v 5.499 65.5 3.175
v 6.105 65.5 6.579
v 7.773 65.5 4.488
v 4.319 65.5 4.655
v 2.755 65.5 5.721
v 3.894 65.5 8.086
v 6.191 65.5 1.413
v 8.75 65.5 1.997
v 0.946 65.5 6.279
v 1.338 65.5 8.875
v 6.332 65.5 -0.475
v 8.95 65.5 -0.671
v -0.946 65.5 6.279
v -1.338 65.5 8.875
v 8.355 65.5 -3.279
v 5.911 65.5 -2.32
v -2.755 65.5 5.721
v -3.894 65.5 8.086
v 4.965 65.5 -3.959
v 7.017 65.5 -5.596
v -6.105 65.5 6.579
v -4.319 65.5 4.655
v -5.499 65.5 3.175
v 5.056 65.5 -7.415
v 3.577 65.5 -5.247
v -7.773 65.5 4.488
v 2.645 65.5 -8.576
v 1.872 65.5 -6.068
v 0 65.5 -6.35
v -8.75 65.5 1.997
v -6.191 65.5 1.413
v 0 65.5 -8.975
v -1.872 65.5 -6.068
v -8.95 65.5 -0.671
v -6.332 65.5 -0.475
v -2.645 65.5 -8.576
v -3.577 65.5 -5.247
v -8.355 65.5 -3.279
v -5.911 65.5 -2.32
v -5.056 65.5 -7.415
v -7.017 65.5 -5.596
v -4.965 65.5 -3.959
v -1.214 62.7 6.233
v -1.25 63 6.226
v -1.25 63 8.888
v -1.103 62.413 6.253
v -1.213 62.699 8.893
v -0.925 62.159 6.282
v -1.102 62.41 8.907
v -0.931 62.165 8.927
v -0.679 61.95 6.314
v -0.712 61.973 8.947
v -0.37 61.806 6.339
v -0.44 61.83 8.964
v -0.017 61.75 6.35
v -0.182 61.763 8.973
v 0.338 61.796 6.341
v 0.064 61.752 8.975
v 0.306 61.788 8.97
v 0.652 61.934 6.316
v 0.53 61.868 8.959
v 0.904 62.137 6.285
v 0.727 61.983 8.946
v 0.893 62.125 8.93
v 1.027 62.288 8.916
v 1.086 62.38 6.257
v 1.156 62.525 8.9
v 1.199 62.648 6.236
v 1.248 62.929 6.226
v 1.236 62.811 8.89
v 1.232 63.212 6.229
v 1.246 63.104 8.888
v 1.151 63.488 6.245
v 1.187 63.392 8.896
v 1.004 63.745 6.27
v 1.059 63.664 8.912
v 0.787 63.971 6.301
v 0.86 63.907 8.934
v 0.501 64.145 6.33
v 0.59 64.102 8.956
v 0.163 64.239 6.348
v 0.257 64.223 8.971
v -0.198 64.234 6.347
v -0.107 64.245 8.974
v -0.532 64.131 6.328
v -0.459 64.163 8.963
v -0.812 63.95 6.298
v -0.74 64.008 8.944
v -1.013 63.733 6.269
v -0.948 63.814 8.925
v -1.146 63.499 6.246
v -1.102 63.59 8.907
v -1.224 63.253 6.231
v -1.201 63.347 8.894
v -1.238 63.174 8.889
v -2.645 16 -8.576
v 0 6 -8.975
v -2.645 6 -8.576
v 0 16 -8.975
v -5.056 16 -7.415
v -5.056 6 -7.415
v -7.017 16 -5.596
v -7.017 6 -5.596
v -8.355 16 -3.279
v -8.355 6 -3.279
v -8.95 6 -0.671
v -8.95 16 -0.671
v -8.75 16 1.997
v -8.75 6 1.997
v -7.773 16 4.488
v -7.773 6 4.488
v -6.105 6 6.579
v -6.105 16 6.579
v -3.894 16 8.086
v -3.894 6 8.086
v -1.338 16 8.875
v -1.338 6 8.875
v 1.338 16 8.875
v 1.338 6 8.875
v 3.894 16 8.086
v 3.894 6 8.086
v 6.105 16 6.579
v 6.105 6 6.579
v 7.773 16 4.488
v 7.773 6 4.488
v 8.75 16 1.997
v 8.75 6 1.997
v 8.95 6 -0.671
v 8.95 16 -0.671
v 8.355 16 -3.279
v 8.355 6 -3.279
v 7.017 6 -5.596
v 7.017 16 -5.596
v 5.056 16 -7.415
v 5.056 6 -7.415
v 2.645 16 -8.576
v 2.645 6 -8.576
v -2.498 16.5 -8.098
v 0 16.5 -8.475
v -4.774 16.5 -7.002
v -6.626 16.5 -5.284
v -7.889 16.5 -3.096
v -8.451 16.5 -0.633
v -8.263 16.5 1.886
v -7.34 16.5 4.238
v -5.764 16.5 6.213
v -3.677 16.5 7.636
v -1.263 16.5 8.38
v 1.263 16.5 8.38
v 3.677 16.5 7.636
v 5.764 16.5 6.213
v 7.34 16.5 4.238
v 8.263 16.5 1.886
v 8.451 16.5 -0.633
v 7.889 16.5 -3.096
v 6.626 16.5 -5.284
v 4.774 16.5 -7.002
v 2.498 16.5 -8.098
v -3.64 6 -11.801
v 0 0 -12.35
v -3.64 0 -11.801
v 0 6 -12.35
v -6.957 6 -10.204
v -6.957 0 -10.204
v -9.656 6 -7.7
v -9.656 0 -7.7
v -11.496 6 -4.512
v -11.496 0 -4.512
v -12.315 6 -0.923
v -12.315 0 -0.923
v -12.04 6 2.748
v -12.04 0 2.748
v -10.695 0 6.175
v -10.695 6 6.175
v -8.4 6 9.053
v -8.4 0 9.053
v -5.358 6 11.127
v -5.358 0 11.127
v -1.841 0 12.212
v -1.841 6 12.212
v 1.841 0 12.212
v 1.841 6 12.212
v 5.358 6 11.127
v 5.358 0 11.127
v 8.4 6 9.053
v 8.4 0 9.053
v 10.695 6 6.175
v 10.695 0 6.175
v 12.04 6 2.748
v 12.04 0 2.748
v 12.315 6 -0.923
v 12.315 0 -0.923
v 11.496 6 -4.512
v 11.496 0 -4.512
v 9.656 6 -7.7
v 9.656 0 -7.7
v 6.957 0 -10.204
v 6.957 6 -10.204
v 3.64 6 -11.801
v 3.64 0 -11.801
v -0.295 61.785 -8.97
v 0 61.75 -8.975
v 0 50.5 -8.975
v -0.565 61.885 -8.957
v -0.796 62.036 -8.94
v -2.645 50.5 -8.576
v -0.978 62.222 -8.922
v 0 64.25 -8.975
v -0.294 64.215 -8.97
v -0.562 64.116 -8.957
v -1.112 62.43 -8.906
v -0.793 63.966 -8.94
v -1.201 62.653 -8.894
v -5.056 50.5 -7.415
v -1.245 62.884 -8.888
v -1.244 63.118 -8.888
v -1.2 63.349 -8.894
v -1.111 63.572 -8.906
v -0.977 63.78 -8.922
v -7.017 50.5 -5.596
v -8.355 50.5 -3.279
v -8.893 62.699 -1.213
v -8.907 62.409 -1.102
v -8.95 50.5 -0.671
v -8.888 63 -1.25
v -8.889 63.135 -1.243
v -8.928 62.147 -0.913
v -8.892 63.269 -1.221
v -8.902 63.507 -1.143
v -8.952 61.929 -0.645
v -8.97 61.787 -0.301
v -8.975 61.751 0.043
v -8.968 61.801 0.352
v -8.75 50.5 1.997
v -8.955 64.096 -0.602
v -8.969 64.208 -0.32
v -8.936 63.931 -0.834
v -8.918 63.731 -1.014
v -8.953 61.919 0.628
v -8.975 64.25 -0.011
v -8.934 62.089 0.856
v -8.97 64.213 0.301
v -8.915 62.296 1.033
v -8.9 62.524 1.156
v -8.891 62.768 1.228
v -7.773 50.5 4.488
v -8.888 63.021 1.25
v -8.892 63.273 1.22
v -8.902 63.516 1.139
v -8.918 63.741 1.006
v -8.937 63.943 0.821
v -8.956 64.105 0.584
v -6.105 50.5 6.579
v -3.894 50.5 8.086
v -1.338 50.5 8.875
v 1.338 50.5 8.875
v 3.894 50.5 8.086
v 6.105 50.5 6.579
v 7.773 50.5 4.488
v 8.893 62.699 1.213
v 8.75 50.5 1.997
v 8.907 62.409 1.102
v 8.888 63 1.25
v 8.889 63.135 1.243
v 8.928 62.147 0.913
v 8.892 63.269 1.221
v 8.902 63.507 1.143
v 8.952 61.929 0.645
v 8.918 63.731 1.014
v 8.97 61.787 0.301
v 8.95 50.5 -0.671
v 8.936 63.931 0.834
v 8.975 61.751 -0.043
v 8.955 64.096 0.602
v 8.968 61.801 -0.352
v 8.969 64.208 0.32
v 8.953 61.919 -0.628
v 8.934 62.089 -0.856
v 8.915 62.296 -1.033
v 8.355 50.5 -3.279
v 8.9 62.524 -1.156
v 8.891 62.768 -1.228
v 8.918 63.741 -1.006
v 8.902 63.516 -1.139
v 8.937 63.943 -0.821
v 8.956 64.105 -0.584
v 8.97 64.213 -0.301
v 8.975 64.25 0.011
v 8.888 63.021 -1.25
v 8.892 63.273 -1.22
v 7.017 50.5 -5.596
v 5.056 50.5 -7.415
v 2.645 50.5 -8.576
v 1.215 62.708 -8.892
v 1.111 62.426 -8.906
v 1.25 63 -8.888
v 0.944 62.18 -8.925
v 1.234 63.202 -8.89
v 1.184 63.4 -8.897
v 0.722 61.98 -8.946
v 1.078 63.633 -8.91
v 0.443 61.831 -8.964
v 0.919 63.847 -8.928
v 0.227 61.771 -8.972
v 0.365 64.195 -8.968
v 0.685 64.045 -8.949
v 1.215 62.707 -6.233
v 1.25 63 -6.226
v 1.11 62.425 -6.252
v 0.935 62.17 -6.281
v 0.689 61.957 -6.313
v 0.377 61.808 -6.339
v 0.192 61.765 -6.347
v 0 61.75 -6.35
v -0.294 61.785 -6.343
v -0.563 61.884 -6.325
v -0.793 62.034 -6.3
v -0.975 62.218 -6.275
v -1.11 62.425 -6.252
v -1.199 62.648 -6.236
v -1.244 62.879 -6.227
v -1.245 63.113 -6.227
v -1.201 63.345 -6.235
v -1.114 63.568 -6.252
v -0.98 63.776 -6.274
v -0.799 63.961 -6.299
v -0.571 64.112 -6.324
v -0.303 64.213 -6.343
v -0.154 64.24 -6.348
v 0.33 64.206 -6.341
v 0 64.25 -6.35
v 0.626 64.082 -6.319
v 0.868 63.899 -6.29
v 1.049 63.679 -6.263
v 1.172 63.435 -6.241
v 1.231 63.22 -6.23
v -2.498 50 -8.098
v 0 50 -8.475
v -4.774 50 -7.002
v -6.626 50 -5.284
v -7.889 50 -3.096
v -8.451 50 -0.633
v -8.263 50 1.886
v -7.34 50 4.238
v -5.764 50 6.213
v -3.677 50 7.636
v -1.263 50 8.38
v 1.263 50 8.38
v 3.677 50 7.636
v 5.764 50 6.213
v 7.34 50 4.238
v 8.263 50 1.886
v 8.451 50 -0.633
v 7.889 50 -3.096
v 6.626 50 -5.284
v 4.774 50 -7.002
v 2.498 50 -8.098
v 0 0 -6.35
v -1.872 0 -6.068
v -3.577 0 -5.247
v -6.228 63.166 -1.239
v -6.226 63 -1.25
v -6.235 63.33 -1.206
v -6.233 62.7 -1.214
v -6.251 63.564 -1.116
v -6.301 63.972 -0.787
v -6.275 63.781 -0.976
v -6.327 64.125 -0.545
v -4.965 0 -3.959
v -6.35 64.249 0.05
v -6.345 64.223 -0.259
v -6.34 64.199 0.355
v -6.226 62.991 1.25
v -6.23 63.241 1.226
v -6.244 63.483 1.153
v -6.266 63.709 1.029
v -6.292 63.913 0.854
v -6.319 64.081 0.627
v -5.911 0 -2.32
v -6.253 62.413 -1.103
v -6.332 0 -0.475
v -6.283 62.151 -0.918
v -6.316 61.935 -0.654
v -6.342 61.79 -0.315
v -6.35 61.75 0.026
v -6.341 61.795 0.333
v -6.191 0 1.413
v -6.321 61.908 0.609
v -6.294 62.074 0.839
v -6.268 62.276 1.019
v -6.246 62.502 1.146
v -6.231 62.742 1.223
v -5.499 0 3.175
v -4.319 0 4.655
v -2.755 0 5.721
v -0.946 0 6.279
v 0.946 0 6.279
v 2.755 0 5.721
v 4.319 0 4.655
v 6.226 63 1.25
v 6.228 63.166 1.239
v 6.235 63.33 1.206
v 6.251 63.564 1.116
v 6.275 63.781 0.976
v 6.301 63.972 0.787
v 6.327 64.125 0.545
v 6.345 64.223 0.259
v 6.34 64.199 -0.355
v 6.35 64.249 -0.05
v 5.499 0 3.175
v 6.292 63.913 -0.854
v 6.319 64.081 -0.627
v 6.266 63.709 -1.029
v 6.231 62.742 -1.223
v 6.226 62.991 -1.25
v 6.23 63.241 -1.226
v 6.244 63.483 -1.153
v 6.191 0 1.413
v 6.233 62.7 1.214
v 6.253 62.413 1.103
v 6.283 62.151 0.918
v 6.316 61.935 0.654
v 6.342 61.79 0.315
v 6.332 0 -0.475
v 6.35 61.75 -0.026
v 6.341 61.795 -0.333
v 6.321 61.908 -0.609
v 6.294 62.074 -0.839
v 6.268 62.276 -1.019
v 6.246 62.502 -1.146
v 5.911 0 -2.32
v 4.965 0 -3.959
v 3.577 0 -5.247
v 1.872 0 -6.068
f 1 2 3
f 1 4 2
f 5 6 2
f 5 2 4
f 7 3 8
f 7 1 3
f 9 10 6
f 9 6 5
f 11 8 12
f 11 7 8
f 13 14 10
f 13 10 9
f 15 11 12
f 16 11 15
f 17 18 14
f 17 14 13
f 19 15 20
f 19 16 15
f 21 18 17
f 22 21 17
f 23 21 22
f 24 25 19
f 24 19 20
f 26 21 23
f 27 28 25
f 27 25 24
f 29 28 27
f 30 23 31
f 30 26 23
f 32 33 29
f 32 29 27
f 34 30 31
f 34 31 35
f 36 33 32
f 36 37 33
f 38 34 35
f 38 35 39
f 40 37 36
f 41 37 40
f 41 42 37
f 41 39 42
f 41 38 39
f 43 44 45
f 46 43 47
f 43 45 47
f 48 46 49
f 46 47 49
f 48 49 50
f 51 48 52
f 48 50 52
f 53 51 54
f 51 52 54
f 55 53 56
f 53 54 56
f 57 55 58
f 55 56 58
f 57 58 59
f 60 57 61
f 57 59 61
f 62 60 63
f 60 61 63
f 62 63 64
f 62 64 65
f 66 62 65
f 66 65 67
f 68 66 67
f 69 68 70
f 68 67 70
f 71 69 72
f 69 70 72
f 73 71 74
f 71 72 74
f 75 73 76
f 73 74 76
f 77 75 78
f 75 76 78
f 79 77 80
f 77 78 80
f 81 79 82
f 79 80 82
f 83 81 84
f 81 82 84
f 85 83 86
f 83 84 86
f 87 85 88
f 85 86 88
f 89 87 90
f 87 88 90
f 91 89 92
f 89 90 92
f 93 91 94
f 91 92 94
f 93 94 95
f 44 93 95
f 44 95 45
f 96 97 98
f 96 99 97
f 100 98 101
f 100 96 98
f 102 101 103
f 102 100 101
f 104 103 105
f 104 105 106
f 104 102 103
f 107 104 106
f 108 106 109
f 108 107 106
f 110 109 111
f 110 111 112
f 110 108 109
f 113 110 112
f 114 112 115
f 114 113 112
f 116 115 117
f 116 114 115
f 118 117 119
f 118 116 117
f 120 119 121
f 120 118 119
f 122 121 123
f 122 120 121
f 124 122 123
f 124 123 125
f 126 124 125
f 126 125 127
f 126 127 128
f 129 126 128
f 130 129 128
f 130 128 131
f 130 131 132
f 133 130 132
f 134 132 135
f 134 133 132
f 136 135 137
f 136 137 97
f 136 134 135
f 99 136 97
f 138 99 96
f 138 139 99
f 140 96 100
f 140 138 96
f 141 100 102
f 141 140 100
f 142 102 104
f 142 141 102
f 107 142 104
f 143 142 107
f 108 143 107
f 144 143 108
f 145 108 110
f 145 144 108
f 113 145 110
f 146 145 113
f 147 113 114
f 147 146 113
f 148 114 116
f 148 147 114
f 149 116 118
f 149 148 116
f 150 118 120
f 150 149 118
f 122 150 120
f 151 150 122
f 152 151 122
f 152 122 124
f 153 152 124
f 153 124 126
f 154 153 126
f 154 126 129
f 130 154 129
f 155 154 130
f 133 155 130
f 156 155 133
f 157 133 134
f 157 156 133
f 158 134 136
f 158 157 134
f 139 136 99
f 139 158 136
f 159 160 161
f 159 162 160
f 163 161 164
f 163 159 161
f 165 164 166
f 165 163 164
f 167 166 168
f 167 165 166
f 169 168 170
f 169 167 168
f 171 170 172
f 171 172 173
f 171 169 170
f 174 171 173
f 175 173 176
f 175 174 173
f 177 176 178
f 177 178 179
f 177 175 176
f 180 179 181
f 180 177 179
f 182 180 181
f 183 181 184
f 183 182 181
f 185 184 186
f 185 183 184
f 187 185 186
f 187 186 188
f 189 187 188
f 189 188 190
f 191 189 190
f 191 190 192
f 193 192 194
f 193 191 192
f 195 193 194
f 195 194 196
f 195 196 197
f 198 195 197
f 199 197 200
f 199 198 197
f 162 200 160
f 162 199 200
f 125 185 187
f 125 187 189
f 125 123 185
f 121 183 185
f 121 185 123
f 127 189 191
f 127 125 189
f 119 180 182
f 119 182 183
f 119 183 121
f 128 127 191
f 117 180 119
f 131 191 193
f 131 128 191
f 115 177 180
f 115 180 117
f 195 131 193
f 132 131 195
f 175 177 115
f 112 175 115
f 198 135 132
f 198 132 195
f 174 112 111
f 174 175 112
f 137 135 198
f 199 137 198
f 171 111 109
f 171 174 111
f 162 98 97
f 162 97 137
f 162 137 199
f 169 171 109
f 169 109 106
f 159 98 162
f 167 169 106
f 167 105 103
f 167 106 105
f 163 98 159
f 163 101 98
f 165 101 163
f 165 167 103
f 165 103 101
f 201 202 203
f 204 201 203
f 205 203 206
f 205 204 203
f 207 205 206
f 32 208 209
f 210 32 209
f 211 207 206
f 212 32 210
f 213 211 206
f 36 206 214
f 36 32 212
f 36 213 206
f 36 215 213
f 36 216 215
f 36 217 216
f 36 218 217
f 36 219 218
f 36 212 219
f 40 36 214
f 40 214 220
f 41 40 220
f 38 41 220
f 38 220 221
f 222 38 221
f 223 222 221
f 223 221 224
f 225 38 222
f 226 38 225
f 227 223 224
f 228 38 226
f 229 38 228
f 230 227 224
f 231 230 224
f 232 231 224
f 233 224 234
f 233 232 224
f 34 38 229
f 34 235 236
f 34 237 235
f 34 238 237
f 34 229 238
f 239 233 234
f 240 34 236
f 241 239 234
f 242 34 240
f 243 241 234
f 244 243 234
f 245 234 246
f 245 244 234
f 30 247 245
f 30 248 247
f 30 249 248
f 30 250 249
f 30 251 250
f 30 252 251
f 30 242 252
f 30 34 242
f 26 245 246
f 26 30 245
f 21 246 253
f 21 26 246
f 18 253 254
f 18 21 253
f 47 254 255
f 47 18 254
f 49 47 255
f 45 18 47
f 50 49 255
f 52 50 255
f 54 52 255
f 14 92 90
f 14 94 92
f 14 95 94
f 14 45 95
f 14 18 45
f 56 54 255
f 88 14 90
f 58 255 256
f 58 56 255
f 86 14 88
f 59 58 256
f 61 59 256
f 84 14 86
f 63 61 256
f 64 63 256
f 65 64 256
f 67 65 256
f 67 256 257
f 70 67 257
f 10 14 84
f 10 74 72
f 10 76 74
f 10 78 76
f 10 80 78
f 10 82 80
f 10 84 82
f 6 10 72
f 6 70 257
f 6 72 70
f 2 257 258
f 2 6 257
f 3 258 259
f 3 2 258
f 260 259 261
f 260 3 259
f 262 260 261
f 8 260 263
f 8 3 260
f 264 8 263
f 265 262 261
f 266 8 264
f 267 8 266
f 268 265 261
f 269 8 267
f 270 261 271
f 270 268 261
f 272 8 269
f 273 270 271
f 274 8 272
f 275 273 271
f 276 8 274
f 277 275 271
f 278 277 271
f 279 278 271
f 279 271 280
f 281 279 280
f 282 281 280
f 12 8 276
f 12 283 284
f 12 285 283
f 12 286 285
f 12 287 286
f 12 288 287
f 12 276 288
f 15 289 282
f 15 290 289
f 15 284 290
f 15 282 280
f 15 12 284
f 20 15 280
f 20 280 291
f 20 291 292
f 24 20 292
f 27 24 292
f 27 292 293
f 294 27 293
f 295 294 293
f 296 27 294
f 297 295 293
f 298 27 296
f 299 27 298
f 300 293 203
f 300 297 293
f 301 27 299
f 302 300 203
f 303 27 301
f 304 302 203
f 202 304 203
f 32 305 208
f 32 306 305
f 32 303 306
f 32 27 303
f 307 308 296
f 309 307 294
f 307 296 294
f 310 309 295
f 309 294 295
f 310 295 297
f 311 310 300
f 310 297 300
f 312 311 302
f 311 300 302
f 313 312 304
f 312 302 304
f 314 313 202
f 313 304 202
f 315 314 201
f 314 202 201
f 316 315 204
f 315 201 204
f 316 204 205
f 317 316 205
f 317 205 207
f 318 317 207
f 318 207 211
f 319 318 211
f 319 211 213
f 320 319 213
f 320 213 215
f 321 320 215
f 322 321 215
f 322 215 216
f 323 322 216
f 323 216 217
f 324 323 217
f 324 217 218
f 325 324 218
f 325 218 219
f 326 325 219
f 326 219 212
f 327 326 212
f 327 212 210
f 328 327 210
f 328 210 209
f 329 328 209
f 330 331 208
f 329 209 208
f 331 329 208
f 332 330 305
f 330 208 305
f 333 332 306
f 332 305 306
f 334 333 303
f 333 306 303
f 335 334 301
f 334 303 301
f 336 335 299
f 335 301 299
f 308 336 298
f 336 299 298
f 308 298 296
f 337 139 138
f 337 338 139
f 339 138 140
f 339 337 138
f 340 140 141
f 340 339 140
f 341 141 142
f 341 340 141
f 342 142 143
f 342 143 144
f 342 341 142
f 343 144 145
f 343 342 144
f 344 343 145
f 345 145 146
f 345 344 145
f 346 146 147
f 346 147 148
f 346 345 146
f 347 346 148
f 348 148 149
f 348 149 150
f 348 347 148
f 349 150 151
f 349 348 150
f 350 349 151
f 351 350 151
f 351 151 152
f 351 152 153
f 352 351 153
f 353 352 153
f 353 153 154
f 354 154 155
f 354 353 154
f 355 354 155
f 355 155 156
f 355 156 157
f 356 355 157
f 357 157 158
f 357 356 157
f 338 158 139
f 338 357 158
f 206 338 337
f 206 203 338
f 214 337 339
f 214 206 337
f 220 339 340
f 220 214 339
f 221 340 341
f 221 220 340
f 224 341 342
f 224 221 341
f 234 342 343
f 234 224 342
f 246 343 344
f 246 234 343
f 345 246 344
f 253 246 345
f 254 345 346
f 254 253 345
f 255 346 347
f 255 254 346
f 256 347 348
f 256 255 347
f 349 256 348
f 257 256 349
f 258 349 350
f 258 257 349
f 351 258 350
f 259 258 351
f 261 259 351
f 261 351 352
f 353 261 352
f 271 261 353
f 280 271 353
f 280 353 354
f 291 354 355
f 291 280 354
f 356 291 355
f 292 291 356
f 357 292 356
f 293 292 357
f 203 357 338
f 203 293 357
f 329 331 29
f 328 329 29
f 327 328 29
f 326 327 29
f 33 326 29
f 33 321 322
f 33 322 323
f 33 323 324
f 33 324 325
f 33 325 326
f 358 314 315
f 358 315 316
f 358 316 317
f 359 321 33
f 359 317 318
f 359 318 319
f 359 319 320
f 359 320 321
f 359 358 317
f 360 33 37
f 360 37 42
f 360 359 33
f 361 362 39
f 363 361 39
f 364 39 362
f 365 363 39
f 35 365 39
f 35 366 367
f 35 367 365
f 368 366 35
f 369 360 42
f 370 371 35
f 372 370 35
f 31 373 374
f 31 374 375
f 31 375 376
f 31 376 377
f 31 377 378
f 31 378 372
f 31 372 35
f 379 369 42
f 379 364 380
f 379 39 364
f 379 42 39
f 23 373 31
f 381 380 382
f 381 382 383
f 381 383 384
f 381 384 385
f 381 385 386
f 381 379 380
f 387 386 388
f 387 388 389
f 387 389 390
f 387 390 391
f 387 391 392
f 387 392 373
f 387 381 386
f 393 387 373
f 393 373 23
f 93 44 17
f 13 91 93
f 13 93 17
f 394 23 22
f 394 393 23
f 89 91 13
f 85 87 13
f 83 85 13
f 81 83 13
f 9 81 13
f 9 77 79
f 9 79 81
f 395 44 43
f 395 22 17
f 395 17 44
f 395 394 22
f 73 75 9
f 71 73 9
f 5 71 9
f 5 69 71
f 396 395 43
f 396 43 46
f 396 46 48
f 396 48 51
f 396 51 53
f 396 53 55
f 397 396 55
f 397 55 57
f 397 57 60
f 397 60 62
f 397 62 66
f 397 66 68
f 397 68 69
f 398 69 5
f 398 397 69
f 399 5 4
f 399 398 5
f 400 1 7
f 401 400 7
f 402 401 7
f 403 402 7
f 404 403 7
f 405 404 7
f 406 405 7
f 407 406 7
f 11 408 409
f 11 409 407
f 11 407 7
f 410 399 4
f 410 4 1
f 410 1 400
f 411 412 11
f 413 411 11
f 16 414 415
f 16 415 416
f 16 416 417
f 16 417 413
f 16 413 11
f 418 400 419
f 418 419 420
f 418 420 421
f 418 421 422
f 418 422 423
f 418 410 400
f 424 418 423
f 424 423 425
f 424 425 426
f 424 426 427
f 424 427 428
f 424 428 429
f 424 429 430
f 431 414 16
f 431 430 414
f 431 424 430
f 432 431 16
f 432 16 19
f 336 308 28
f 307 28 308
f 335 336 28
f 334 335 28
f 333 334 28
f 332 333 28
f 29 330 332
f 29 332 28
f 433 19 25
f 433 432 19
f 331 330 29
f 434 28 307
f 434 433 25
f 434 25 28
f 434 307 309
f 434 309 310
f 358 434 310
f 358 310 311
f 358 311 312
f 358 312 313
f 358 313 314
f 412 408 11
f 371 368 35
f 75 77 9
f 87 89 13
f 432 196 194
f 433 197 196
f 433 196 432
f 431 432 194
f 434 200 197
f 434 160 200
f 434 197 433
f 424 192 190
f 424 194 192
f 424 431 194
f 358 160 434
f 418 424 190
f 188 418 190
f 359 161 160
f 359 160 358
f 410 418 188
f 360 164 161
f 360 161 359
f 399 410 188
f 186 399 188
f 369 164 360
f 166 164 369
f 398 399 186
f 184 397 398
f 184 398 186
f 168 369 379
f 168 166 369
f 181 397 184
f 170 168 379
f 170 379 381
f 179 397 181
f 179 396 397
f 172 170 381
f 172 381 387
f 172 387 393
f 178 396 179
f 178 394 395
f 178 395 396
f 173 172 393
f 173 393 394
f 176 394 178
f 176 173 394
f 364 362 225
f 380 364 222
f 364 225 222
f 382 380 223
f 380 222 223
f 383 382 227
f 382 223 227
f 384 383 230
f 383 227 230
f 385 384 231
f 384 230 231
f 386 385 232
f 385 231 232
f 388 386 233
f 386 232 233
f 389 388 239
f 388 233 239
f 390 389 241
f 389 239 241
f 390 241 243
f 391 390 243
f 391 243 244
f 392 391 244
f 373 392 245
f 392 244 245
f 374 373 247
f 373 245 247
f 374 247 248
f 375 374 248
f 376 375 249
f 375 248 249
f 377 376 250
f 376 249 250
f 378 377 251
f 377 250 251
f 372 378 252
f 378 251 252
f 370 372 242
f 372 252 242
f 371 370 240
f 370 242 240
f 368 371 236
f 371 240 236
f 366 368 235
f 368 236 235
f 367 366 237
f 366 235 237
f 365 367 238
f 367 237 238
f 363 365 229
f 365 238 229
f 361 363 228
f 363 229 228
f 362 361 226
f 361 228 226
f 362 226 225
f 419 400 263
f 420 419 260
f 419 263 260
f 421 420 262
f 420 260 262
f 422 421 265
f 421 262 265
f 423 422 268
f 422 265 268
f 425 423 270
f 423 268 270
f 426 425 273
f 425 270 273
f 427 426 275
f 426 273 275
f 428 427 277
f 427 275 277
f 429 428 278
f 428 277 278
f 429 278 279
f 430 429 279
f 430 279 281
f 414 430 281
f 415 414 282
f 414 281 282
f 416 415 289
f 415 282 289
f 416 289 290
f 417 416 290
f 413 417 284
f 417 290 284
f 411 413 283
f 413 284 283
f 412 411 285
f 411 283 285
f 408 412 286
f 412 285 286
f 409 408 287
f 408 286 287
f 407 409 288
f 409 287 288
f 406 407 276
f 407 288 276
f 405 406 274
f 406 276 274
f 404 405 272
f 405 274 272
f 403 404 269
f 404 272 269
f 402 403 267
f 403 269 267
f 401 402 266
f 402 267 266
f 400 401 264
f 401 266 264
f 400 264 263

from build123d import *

# Parameters (mm, degrees)
SKETCH_6_W               = 1.25
SKETCH_6_H               = 12.35
PATTERN_CIRCULAR_1_COUNT = 4


with BuildPart() as part:
    # 草图1 → 旋转1 (revolve)
    with BuildSketch(Plane.XY, mode=Mode.PRIVATE) as revolve_1_sk:
        Polygon((6.35, 65.5), (6.35, 0), (12.35, 0), (12.35, 6), (8.975, 6), (8.975, 16), (8.475, 16.5), (8.475, 50), (8.975, 50.5), (8.975, 65.5), align=None)
    revolve(revolve_1_sk.sketch.rotate(Axis((0, 0, 0), (0, 1, 0)), 90), axis=Axis((0, 0, 0), (0, 1, 0)))

    # 草图6 → M3 螺纹孔1 (revolve, cut)
    with BuildSketch(Plane.ZX.offset(63)):
        with Locations((0.625, 6.175)):
            Rectangle(SKETCH_6_W, SKETCH_6_H)
    hole_wizard_m3_1 = revolve(axis=Axis((-6.35, 63, 0), (1, 0, 0)), mode=Mode.SUBTRACT)

    # 阵列(圆周)1: M3 螺纹孔1 ×4 about axis
    pattern_circular_1_axis = Axis((0, 65.5, 0), (0, -1, 0))
    for i in range(1, PATTERN_CIRCULAR_1_COUNT):
        add(hole_wizard_m3_1.rotate(pattern_circular_1_axis, i * 360 / PATTERN_CIRCULAR_1_COUNT), mode=Mode.SUBTRACT)


solid = part.part
